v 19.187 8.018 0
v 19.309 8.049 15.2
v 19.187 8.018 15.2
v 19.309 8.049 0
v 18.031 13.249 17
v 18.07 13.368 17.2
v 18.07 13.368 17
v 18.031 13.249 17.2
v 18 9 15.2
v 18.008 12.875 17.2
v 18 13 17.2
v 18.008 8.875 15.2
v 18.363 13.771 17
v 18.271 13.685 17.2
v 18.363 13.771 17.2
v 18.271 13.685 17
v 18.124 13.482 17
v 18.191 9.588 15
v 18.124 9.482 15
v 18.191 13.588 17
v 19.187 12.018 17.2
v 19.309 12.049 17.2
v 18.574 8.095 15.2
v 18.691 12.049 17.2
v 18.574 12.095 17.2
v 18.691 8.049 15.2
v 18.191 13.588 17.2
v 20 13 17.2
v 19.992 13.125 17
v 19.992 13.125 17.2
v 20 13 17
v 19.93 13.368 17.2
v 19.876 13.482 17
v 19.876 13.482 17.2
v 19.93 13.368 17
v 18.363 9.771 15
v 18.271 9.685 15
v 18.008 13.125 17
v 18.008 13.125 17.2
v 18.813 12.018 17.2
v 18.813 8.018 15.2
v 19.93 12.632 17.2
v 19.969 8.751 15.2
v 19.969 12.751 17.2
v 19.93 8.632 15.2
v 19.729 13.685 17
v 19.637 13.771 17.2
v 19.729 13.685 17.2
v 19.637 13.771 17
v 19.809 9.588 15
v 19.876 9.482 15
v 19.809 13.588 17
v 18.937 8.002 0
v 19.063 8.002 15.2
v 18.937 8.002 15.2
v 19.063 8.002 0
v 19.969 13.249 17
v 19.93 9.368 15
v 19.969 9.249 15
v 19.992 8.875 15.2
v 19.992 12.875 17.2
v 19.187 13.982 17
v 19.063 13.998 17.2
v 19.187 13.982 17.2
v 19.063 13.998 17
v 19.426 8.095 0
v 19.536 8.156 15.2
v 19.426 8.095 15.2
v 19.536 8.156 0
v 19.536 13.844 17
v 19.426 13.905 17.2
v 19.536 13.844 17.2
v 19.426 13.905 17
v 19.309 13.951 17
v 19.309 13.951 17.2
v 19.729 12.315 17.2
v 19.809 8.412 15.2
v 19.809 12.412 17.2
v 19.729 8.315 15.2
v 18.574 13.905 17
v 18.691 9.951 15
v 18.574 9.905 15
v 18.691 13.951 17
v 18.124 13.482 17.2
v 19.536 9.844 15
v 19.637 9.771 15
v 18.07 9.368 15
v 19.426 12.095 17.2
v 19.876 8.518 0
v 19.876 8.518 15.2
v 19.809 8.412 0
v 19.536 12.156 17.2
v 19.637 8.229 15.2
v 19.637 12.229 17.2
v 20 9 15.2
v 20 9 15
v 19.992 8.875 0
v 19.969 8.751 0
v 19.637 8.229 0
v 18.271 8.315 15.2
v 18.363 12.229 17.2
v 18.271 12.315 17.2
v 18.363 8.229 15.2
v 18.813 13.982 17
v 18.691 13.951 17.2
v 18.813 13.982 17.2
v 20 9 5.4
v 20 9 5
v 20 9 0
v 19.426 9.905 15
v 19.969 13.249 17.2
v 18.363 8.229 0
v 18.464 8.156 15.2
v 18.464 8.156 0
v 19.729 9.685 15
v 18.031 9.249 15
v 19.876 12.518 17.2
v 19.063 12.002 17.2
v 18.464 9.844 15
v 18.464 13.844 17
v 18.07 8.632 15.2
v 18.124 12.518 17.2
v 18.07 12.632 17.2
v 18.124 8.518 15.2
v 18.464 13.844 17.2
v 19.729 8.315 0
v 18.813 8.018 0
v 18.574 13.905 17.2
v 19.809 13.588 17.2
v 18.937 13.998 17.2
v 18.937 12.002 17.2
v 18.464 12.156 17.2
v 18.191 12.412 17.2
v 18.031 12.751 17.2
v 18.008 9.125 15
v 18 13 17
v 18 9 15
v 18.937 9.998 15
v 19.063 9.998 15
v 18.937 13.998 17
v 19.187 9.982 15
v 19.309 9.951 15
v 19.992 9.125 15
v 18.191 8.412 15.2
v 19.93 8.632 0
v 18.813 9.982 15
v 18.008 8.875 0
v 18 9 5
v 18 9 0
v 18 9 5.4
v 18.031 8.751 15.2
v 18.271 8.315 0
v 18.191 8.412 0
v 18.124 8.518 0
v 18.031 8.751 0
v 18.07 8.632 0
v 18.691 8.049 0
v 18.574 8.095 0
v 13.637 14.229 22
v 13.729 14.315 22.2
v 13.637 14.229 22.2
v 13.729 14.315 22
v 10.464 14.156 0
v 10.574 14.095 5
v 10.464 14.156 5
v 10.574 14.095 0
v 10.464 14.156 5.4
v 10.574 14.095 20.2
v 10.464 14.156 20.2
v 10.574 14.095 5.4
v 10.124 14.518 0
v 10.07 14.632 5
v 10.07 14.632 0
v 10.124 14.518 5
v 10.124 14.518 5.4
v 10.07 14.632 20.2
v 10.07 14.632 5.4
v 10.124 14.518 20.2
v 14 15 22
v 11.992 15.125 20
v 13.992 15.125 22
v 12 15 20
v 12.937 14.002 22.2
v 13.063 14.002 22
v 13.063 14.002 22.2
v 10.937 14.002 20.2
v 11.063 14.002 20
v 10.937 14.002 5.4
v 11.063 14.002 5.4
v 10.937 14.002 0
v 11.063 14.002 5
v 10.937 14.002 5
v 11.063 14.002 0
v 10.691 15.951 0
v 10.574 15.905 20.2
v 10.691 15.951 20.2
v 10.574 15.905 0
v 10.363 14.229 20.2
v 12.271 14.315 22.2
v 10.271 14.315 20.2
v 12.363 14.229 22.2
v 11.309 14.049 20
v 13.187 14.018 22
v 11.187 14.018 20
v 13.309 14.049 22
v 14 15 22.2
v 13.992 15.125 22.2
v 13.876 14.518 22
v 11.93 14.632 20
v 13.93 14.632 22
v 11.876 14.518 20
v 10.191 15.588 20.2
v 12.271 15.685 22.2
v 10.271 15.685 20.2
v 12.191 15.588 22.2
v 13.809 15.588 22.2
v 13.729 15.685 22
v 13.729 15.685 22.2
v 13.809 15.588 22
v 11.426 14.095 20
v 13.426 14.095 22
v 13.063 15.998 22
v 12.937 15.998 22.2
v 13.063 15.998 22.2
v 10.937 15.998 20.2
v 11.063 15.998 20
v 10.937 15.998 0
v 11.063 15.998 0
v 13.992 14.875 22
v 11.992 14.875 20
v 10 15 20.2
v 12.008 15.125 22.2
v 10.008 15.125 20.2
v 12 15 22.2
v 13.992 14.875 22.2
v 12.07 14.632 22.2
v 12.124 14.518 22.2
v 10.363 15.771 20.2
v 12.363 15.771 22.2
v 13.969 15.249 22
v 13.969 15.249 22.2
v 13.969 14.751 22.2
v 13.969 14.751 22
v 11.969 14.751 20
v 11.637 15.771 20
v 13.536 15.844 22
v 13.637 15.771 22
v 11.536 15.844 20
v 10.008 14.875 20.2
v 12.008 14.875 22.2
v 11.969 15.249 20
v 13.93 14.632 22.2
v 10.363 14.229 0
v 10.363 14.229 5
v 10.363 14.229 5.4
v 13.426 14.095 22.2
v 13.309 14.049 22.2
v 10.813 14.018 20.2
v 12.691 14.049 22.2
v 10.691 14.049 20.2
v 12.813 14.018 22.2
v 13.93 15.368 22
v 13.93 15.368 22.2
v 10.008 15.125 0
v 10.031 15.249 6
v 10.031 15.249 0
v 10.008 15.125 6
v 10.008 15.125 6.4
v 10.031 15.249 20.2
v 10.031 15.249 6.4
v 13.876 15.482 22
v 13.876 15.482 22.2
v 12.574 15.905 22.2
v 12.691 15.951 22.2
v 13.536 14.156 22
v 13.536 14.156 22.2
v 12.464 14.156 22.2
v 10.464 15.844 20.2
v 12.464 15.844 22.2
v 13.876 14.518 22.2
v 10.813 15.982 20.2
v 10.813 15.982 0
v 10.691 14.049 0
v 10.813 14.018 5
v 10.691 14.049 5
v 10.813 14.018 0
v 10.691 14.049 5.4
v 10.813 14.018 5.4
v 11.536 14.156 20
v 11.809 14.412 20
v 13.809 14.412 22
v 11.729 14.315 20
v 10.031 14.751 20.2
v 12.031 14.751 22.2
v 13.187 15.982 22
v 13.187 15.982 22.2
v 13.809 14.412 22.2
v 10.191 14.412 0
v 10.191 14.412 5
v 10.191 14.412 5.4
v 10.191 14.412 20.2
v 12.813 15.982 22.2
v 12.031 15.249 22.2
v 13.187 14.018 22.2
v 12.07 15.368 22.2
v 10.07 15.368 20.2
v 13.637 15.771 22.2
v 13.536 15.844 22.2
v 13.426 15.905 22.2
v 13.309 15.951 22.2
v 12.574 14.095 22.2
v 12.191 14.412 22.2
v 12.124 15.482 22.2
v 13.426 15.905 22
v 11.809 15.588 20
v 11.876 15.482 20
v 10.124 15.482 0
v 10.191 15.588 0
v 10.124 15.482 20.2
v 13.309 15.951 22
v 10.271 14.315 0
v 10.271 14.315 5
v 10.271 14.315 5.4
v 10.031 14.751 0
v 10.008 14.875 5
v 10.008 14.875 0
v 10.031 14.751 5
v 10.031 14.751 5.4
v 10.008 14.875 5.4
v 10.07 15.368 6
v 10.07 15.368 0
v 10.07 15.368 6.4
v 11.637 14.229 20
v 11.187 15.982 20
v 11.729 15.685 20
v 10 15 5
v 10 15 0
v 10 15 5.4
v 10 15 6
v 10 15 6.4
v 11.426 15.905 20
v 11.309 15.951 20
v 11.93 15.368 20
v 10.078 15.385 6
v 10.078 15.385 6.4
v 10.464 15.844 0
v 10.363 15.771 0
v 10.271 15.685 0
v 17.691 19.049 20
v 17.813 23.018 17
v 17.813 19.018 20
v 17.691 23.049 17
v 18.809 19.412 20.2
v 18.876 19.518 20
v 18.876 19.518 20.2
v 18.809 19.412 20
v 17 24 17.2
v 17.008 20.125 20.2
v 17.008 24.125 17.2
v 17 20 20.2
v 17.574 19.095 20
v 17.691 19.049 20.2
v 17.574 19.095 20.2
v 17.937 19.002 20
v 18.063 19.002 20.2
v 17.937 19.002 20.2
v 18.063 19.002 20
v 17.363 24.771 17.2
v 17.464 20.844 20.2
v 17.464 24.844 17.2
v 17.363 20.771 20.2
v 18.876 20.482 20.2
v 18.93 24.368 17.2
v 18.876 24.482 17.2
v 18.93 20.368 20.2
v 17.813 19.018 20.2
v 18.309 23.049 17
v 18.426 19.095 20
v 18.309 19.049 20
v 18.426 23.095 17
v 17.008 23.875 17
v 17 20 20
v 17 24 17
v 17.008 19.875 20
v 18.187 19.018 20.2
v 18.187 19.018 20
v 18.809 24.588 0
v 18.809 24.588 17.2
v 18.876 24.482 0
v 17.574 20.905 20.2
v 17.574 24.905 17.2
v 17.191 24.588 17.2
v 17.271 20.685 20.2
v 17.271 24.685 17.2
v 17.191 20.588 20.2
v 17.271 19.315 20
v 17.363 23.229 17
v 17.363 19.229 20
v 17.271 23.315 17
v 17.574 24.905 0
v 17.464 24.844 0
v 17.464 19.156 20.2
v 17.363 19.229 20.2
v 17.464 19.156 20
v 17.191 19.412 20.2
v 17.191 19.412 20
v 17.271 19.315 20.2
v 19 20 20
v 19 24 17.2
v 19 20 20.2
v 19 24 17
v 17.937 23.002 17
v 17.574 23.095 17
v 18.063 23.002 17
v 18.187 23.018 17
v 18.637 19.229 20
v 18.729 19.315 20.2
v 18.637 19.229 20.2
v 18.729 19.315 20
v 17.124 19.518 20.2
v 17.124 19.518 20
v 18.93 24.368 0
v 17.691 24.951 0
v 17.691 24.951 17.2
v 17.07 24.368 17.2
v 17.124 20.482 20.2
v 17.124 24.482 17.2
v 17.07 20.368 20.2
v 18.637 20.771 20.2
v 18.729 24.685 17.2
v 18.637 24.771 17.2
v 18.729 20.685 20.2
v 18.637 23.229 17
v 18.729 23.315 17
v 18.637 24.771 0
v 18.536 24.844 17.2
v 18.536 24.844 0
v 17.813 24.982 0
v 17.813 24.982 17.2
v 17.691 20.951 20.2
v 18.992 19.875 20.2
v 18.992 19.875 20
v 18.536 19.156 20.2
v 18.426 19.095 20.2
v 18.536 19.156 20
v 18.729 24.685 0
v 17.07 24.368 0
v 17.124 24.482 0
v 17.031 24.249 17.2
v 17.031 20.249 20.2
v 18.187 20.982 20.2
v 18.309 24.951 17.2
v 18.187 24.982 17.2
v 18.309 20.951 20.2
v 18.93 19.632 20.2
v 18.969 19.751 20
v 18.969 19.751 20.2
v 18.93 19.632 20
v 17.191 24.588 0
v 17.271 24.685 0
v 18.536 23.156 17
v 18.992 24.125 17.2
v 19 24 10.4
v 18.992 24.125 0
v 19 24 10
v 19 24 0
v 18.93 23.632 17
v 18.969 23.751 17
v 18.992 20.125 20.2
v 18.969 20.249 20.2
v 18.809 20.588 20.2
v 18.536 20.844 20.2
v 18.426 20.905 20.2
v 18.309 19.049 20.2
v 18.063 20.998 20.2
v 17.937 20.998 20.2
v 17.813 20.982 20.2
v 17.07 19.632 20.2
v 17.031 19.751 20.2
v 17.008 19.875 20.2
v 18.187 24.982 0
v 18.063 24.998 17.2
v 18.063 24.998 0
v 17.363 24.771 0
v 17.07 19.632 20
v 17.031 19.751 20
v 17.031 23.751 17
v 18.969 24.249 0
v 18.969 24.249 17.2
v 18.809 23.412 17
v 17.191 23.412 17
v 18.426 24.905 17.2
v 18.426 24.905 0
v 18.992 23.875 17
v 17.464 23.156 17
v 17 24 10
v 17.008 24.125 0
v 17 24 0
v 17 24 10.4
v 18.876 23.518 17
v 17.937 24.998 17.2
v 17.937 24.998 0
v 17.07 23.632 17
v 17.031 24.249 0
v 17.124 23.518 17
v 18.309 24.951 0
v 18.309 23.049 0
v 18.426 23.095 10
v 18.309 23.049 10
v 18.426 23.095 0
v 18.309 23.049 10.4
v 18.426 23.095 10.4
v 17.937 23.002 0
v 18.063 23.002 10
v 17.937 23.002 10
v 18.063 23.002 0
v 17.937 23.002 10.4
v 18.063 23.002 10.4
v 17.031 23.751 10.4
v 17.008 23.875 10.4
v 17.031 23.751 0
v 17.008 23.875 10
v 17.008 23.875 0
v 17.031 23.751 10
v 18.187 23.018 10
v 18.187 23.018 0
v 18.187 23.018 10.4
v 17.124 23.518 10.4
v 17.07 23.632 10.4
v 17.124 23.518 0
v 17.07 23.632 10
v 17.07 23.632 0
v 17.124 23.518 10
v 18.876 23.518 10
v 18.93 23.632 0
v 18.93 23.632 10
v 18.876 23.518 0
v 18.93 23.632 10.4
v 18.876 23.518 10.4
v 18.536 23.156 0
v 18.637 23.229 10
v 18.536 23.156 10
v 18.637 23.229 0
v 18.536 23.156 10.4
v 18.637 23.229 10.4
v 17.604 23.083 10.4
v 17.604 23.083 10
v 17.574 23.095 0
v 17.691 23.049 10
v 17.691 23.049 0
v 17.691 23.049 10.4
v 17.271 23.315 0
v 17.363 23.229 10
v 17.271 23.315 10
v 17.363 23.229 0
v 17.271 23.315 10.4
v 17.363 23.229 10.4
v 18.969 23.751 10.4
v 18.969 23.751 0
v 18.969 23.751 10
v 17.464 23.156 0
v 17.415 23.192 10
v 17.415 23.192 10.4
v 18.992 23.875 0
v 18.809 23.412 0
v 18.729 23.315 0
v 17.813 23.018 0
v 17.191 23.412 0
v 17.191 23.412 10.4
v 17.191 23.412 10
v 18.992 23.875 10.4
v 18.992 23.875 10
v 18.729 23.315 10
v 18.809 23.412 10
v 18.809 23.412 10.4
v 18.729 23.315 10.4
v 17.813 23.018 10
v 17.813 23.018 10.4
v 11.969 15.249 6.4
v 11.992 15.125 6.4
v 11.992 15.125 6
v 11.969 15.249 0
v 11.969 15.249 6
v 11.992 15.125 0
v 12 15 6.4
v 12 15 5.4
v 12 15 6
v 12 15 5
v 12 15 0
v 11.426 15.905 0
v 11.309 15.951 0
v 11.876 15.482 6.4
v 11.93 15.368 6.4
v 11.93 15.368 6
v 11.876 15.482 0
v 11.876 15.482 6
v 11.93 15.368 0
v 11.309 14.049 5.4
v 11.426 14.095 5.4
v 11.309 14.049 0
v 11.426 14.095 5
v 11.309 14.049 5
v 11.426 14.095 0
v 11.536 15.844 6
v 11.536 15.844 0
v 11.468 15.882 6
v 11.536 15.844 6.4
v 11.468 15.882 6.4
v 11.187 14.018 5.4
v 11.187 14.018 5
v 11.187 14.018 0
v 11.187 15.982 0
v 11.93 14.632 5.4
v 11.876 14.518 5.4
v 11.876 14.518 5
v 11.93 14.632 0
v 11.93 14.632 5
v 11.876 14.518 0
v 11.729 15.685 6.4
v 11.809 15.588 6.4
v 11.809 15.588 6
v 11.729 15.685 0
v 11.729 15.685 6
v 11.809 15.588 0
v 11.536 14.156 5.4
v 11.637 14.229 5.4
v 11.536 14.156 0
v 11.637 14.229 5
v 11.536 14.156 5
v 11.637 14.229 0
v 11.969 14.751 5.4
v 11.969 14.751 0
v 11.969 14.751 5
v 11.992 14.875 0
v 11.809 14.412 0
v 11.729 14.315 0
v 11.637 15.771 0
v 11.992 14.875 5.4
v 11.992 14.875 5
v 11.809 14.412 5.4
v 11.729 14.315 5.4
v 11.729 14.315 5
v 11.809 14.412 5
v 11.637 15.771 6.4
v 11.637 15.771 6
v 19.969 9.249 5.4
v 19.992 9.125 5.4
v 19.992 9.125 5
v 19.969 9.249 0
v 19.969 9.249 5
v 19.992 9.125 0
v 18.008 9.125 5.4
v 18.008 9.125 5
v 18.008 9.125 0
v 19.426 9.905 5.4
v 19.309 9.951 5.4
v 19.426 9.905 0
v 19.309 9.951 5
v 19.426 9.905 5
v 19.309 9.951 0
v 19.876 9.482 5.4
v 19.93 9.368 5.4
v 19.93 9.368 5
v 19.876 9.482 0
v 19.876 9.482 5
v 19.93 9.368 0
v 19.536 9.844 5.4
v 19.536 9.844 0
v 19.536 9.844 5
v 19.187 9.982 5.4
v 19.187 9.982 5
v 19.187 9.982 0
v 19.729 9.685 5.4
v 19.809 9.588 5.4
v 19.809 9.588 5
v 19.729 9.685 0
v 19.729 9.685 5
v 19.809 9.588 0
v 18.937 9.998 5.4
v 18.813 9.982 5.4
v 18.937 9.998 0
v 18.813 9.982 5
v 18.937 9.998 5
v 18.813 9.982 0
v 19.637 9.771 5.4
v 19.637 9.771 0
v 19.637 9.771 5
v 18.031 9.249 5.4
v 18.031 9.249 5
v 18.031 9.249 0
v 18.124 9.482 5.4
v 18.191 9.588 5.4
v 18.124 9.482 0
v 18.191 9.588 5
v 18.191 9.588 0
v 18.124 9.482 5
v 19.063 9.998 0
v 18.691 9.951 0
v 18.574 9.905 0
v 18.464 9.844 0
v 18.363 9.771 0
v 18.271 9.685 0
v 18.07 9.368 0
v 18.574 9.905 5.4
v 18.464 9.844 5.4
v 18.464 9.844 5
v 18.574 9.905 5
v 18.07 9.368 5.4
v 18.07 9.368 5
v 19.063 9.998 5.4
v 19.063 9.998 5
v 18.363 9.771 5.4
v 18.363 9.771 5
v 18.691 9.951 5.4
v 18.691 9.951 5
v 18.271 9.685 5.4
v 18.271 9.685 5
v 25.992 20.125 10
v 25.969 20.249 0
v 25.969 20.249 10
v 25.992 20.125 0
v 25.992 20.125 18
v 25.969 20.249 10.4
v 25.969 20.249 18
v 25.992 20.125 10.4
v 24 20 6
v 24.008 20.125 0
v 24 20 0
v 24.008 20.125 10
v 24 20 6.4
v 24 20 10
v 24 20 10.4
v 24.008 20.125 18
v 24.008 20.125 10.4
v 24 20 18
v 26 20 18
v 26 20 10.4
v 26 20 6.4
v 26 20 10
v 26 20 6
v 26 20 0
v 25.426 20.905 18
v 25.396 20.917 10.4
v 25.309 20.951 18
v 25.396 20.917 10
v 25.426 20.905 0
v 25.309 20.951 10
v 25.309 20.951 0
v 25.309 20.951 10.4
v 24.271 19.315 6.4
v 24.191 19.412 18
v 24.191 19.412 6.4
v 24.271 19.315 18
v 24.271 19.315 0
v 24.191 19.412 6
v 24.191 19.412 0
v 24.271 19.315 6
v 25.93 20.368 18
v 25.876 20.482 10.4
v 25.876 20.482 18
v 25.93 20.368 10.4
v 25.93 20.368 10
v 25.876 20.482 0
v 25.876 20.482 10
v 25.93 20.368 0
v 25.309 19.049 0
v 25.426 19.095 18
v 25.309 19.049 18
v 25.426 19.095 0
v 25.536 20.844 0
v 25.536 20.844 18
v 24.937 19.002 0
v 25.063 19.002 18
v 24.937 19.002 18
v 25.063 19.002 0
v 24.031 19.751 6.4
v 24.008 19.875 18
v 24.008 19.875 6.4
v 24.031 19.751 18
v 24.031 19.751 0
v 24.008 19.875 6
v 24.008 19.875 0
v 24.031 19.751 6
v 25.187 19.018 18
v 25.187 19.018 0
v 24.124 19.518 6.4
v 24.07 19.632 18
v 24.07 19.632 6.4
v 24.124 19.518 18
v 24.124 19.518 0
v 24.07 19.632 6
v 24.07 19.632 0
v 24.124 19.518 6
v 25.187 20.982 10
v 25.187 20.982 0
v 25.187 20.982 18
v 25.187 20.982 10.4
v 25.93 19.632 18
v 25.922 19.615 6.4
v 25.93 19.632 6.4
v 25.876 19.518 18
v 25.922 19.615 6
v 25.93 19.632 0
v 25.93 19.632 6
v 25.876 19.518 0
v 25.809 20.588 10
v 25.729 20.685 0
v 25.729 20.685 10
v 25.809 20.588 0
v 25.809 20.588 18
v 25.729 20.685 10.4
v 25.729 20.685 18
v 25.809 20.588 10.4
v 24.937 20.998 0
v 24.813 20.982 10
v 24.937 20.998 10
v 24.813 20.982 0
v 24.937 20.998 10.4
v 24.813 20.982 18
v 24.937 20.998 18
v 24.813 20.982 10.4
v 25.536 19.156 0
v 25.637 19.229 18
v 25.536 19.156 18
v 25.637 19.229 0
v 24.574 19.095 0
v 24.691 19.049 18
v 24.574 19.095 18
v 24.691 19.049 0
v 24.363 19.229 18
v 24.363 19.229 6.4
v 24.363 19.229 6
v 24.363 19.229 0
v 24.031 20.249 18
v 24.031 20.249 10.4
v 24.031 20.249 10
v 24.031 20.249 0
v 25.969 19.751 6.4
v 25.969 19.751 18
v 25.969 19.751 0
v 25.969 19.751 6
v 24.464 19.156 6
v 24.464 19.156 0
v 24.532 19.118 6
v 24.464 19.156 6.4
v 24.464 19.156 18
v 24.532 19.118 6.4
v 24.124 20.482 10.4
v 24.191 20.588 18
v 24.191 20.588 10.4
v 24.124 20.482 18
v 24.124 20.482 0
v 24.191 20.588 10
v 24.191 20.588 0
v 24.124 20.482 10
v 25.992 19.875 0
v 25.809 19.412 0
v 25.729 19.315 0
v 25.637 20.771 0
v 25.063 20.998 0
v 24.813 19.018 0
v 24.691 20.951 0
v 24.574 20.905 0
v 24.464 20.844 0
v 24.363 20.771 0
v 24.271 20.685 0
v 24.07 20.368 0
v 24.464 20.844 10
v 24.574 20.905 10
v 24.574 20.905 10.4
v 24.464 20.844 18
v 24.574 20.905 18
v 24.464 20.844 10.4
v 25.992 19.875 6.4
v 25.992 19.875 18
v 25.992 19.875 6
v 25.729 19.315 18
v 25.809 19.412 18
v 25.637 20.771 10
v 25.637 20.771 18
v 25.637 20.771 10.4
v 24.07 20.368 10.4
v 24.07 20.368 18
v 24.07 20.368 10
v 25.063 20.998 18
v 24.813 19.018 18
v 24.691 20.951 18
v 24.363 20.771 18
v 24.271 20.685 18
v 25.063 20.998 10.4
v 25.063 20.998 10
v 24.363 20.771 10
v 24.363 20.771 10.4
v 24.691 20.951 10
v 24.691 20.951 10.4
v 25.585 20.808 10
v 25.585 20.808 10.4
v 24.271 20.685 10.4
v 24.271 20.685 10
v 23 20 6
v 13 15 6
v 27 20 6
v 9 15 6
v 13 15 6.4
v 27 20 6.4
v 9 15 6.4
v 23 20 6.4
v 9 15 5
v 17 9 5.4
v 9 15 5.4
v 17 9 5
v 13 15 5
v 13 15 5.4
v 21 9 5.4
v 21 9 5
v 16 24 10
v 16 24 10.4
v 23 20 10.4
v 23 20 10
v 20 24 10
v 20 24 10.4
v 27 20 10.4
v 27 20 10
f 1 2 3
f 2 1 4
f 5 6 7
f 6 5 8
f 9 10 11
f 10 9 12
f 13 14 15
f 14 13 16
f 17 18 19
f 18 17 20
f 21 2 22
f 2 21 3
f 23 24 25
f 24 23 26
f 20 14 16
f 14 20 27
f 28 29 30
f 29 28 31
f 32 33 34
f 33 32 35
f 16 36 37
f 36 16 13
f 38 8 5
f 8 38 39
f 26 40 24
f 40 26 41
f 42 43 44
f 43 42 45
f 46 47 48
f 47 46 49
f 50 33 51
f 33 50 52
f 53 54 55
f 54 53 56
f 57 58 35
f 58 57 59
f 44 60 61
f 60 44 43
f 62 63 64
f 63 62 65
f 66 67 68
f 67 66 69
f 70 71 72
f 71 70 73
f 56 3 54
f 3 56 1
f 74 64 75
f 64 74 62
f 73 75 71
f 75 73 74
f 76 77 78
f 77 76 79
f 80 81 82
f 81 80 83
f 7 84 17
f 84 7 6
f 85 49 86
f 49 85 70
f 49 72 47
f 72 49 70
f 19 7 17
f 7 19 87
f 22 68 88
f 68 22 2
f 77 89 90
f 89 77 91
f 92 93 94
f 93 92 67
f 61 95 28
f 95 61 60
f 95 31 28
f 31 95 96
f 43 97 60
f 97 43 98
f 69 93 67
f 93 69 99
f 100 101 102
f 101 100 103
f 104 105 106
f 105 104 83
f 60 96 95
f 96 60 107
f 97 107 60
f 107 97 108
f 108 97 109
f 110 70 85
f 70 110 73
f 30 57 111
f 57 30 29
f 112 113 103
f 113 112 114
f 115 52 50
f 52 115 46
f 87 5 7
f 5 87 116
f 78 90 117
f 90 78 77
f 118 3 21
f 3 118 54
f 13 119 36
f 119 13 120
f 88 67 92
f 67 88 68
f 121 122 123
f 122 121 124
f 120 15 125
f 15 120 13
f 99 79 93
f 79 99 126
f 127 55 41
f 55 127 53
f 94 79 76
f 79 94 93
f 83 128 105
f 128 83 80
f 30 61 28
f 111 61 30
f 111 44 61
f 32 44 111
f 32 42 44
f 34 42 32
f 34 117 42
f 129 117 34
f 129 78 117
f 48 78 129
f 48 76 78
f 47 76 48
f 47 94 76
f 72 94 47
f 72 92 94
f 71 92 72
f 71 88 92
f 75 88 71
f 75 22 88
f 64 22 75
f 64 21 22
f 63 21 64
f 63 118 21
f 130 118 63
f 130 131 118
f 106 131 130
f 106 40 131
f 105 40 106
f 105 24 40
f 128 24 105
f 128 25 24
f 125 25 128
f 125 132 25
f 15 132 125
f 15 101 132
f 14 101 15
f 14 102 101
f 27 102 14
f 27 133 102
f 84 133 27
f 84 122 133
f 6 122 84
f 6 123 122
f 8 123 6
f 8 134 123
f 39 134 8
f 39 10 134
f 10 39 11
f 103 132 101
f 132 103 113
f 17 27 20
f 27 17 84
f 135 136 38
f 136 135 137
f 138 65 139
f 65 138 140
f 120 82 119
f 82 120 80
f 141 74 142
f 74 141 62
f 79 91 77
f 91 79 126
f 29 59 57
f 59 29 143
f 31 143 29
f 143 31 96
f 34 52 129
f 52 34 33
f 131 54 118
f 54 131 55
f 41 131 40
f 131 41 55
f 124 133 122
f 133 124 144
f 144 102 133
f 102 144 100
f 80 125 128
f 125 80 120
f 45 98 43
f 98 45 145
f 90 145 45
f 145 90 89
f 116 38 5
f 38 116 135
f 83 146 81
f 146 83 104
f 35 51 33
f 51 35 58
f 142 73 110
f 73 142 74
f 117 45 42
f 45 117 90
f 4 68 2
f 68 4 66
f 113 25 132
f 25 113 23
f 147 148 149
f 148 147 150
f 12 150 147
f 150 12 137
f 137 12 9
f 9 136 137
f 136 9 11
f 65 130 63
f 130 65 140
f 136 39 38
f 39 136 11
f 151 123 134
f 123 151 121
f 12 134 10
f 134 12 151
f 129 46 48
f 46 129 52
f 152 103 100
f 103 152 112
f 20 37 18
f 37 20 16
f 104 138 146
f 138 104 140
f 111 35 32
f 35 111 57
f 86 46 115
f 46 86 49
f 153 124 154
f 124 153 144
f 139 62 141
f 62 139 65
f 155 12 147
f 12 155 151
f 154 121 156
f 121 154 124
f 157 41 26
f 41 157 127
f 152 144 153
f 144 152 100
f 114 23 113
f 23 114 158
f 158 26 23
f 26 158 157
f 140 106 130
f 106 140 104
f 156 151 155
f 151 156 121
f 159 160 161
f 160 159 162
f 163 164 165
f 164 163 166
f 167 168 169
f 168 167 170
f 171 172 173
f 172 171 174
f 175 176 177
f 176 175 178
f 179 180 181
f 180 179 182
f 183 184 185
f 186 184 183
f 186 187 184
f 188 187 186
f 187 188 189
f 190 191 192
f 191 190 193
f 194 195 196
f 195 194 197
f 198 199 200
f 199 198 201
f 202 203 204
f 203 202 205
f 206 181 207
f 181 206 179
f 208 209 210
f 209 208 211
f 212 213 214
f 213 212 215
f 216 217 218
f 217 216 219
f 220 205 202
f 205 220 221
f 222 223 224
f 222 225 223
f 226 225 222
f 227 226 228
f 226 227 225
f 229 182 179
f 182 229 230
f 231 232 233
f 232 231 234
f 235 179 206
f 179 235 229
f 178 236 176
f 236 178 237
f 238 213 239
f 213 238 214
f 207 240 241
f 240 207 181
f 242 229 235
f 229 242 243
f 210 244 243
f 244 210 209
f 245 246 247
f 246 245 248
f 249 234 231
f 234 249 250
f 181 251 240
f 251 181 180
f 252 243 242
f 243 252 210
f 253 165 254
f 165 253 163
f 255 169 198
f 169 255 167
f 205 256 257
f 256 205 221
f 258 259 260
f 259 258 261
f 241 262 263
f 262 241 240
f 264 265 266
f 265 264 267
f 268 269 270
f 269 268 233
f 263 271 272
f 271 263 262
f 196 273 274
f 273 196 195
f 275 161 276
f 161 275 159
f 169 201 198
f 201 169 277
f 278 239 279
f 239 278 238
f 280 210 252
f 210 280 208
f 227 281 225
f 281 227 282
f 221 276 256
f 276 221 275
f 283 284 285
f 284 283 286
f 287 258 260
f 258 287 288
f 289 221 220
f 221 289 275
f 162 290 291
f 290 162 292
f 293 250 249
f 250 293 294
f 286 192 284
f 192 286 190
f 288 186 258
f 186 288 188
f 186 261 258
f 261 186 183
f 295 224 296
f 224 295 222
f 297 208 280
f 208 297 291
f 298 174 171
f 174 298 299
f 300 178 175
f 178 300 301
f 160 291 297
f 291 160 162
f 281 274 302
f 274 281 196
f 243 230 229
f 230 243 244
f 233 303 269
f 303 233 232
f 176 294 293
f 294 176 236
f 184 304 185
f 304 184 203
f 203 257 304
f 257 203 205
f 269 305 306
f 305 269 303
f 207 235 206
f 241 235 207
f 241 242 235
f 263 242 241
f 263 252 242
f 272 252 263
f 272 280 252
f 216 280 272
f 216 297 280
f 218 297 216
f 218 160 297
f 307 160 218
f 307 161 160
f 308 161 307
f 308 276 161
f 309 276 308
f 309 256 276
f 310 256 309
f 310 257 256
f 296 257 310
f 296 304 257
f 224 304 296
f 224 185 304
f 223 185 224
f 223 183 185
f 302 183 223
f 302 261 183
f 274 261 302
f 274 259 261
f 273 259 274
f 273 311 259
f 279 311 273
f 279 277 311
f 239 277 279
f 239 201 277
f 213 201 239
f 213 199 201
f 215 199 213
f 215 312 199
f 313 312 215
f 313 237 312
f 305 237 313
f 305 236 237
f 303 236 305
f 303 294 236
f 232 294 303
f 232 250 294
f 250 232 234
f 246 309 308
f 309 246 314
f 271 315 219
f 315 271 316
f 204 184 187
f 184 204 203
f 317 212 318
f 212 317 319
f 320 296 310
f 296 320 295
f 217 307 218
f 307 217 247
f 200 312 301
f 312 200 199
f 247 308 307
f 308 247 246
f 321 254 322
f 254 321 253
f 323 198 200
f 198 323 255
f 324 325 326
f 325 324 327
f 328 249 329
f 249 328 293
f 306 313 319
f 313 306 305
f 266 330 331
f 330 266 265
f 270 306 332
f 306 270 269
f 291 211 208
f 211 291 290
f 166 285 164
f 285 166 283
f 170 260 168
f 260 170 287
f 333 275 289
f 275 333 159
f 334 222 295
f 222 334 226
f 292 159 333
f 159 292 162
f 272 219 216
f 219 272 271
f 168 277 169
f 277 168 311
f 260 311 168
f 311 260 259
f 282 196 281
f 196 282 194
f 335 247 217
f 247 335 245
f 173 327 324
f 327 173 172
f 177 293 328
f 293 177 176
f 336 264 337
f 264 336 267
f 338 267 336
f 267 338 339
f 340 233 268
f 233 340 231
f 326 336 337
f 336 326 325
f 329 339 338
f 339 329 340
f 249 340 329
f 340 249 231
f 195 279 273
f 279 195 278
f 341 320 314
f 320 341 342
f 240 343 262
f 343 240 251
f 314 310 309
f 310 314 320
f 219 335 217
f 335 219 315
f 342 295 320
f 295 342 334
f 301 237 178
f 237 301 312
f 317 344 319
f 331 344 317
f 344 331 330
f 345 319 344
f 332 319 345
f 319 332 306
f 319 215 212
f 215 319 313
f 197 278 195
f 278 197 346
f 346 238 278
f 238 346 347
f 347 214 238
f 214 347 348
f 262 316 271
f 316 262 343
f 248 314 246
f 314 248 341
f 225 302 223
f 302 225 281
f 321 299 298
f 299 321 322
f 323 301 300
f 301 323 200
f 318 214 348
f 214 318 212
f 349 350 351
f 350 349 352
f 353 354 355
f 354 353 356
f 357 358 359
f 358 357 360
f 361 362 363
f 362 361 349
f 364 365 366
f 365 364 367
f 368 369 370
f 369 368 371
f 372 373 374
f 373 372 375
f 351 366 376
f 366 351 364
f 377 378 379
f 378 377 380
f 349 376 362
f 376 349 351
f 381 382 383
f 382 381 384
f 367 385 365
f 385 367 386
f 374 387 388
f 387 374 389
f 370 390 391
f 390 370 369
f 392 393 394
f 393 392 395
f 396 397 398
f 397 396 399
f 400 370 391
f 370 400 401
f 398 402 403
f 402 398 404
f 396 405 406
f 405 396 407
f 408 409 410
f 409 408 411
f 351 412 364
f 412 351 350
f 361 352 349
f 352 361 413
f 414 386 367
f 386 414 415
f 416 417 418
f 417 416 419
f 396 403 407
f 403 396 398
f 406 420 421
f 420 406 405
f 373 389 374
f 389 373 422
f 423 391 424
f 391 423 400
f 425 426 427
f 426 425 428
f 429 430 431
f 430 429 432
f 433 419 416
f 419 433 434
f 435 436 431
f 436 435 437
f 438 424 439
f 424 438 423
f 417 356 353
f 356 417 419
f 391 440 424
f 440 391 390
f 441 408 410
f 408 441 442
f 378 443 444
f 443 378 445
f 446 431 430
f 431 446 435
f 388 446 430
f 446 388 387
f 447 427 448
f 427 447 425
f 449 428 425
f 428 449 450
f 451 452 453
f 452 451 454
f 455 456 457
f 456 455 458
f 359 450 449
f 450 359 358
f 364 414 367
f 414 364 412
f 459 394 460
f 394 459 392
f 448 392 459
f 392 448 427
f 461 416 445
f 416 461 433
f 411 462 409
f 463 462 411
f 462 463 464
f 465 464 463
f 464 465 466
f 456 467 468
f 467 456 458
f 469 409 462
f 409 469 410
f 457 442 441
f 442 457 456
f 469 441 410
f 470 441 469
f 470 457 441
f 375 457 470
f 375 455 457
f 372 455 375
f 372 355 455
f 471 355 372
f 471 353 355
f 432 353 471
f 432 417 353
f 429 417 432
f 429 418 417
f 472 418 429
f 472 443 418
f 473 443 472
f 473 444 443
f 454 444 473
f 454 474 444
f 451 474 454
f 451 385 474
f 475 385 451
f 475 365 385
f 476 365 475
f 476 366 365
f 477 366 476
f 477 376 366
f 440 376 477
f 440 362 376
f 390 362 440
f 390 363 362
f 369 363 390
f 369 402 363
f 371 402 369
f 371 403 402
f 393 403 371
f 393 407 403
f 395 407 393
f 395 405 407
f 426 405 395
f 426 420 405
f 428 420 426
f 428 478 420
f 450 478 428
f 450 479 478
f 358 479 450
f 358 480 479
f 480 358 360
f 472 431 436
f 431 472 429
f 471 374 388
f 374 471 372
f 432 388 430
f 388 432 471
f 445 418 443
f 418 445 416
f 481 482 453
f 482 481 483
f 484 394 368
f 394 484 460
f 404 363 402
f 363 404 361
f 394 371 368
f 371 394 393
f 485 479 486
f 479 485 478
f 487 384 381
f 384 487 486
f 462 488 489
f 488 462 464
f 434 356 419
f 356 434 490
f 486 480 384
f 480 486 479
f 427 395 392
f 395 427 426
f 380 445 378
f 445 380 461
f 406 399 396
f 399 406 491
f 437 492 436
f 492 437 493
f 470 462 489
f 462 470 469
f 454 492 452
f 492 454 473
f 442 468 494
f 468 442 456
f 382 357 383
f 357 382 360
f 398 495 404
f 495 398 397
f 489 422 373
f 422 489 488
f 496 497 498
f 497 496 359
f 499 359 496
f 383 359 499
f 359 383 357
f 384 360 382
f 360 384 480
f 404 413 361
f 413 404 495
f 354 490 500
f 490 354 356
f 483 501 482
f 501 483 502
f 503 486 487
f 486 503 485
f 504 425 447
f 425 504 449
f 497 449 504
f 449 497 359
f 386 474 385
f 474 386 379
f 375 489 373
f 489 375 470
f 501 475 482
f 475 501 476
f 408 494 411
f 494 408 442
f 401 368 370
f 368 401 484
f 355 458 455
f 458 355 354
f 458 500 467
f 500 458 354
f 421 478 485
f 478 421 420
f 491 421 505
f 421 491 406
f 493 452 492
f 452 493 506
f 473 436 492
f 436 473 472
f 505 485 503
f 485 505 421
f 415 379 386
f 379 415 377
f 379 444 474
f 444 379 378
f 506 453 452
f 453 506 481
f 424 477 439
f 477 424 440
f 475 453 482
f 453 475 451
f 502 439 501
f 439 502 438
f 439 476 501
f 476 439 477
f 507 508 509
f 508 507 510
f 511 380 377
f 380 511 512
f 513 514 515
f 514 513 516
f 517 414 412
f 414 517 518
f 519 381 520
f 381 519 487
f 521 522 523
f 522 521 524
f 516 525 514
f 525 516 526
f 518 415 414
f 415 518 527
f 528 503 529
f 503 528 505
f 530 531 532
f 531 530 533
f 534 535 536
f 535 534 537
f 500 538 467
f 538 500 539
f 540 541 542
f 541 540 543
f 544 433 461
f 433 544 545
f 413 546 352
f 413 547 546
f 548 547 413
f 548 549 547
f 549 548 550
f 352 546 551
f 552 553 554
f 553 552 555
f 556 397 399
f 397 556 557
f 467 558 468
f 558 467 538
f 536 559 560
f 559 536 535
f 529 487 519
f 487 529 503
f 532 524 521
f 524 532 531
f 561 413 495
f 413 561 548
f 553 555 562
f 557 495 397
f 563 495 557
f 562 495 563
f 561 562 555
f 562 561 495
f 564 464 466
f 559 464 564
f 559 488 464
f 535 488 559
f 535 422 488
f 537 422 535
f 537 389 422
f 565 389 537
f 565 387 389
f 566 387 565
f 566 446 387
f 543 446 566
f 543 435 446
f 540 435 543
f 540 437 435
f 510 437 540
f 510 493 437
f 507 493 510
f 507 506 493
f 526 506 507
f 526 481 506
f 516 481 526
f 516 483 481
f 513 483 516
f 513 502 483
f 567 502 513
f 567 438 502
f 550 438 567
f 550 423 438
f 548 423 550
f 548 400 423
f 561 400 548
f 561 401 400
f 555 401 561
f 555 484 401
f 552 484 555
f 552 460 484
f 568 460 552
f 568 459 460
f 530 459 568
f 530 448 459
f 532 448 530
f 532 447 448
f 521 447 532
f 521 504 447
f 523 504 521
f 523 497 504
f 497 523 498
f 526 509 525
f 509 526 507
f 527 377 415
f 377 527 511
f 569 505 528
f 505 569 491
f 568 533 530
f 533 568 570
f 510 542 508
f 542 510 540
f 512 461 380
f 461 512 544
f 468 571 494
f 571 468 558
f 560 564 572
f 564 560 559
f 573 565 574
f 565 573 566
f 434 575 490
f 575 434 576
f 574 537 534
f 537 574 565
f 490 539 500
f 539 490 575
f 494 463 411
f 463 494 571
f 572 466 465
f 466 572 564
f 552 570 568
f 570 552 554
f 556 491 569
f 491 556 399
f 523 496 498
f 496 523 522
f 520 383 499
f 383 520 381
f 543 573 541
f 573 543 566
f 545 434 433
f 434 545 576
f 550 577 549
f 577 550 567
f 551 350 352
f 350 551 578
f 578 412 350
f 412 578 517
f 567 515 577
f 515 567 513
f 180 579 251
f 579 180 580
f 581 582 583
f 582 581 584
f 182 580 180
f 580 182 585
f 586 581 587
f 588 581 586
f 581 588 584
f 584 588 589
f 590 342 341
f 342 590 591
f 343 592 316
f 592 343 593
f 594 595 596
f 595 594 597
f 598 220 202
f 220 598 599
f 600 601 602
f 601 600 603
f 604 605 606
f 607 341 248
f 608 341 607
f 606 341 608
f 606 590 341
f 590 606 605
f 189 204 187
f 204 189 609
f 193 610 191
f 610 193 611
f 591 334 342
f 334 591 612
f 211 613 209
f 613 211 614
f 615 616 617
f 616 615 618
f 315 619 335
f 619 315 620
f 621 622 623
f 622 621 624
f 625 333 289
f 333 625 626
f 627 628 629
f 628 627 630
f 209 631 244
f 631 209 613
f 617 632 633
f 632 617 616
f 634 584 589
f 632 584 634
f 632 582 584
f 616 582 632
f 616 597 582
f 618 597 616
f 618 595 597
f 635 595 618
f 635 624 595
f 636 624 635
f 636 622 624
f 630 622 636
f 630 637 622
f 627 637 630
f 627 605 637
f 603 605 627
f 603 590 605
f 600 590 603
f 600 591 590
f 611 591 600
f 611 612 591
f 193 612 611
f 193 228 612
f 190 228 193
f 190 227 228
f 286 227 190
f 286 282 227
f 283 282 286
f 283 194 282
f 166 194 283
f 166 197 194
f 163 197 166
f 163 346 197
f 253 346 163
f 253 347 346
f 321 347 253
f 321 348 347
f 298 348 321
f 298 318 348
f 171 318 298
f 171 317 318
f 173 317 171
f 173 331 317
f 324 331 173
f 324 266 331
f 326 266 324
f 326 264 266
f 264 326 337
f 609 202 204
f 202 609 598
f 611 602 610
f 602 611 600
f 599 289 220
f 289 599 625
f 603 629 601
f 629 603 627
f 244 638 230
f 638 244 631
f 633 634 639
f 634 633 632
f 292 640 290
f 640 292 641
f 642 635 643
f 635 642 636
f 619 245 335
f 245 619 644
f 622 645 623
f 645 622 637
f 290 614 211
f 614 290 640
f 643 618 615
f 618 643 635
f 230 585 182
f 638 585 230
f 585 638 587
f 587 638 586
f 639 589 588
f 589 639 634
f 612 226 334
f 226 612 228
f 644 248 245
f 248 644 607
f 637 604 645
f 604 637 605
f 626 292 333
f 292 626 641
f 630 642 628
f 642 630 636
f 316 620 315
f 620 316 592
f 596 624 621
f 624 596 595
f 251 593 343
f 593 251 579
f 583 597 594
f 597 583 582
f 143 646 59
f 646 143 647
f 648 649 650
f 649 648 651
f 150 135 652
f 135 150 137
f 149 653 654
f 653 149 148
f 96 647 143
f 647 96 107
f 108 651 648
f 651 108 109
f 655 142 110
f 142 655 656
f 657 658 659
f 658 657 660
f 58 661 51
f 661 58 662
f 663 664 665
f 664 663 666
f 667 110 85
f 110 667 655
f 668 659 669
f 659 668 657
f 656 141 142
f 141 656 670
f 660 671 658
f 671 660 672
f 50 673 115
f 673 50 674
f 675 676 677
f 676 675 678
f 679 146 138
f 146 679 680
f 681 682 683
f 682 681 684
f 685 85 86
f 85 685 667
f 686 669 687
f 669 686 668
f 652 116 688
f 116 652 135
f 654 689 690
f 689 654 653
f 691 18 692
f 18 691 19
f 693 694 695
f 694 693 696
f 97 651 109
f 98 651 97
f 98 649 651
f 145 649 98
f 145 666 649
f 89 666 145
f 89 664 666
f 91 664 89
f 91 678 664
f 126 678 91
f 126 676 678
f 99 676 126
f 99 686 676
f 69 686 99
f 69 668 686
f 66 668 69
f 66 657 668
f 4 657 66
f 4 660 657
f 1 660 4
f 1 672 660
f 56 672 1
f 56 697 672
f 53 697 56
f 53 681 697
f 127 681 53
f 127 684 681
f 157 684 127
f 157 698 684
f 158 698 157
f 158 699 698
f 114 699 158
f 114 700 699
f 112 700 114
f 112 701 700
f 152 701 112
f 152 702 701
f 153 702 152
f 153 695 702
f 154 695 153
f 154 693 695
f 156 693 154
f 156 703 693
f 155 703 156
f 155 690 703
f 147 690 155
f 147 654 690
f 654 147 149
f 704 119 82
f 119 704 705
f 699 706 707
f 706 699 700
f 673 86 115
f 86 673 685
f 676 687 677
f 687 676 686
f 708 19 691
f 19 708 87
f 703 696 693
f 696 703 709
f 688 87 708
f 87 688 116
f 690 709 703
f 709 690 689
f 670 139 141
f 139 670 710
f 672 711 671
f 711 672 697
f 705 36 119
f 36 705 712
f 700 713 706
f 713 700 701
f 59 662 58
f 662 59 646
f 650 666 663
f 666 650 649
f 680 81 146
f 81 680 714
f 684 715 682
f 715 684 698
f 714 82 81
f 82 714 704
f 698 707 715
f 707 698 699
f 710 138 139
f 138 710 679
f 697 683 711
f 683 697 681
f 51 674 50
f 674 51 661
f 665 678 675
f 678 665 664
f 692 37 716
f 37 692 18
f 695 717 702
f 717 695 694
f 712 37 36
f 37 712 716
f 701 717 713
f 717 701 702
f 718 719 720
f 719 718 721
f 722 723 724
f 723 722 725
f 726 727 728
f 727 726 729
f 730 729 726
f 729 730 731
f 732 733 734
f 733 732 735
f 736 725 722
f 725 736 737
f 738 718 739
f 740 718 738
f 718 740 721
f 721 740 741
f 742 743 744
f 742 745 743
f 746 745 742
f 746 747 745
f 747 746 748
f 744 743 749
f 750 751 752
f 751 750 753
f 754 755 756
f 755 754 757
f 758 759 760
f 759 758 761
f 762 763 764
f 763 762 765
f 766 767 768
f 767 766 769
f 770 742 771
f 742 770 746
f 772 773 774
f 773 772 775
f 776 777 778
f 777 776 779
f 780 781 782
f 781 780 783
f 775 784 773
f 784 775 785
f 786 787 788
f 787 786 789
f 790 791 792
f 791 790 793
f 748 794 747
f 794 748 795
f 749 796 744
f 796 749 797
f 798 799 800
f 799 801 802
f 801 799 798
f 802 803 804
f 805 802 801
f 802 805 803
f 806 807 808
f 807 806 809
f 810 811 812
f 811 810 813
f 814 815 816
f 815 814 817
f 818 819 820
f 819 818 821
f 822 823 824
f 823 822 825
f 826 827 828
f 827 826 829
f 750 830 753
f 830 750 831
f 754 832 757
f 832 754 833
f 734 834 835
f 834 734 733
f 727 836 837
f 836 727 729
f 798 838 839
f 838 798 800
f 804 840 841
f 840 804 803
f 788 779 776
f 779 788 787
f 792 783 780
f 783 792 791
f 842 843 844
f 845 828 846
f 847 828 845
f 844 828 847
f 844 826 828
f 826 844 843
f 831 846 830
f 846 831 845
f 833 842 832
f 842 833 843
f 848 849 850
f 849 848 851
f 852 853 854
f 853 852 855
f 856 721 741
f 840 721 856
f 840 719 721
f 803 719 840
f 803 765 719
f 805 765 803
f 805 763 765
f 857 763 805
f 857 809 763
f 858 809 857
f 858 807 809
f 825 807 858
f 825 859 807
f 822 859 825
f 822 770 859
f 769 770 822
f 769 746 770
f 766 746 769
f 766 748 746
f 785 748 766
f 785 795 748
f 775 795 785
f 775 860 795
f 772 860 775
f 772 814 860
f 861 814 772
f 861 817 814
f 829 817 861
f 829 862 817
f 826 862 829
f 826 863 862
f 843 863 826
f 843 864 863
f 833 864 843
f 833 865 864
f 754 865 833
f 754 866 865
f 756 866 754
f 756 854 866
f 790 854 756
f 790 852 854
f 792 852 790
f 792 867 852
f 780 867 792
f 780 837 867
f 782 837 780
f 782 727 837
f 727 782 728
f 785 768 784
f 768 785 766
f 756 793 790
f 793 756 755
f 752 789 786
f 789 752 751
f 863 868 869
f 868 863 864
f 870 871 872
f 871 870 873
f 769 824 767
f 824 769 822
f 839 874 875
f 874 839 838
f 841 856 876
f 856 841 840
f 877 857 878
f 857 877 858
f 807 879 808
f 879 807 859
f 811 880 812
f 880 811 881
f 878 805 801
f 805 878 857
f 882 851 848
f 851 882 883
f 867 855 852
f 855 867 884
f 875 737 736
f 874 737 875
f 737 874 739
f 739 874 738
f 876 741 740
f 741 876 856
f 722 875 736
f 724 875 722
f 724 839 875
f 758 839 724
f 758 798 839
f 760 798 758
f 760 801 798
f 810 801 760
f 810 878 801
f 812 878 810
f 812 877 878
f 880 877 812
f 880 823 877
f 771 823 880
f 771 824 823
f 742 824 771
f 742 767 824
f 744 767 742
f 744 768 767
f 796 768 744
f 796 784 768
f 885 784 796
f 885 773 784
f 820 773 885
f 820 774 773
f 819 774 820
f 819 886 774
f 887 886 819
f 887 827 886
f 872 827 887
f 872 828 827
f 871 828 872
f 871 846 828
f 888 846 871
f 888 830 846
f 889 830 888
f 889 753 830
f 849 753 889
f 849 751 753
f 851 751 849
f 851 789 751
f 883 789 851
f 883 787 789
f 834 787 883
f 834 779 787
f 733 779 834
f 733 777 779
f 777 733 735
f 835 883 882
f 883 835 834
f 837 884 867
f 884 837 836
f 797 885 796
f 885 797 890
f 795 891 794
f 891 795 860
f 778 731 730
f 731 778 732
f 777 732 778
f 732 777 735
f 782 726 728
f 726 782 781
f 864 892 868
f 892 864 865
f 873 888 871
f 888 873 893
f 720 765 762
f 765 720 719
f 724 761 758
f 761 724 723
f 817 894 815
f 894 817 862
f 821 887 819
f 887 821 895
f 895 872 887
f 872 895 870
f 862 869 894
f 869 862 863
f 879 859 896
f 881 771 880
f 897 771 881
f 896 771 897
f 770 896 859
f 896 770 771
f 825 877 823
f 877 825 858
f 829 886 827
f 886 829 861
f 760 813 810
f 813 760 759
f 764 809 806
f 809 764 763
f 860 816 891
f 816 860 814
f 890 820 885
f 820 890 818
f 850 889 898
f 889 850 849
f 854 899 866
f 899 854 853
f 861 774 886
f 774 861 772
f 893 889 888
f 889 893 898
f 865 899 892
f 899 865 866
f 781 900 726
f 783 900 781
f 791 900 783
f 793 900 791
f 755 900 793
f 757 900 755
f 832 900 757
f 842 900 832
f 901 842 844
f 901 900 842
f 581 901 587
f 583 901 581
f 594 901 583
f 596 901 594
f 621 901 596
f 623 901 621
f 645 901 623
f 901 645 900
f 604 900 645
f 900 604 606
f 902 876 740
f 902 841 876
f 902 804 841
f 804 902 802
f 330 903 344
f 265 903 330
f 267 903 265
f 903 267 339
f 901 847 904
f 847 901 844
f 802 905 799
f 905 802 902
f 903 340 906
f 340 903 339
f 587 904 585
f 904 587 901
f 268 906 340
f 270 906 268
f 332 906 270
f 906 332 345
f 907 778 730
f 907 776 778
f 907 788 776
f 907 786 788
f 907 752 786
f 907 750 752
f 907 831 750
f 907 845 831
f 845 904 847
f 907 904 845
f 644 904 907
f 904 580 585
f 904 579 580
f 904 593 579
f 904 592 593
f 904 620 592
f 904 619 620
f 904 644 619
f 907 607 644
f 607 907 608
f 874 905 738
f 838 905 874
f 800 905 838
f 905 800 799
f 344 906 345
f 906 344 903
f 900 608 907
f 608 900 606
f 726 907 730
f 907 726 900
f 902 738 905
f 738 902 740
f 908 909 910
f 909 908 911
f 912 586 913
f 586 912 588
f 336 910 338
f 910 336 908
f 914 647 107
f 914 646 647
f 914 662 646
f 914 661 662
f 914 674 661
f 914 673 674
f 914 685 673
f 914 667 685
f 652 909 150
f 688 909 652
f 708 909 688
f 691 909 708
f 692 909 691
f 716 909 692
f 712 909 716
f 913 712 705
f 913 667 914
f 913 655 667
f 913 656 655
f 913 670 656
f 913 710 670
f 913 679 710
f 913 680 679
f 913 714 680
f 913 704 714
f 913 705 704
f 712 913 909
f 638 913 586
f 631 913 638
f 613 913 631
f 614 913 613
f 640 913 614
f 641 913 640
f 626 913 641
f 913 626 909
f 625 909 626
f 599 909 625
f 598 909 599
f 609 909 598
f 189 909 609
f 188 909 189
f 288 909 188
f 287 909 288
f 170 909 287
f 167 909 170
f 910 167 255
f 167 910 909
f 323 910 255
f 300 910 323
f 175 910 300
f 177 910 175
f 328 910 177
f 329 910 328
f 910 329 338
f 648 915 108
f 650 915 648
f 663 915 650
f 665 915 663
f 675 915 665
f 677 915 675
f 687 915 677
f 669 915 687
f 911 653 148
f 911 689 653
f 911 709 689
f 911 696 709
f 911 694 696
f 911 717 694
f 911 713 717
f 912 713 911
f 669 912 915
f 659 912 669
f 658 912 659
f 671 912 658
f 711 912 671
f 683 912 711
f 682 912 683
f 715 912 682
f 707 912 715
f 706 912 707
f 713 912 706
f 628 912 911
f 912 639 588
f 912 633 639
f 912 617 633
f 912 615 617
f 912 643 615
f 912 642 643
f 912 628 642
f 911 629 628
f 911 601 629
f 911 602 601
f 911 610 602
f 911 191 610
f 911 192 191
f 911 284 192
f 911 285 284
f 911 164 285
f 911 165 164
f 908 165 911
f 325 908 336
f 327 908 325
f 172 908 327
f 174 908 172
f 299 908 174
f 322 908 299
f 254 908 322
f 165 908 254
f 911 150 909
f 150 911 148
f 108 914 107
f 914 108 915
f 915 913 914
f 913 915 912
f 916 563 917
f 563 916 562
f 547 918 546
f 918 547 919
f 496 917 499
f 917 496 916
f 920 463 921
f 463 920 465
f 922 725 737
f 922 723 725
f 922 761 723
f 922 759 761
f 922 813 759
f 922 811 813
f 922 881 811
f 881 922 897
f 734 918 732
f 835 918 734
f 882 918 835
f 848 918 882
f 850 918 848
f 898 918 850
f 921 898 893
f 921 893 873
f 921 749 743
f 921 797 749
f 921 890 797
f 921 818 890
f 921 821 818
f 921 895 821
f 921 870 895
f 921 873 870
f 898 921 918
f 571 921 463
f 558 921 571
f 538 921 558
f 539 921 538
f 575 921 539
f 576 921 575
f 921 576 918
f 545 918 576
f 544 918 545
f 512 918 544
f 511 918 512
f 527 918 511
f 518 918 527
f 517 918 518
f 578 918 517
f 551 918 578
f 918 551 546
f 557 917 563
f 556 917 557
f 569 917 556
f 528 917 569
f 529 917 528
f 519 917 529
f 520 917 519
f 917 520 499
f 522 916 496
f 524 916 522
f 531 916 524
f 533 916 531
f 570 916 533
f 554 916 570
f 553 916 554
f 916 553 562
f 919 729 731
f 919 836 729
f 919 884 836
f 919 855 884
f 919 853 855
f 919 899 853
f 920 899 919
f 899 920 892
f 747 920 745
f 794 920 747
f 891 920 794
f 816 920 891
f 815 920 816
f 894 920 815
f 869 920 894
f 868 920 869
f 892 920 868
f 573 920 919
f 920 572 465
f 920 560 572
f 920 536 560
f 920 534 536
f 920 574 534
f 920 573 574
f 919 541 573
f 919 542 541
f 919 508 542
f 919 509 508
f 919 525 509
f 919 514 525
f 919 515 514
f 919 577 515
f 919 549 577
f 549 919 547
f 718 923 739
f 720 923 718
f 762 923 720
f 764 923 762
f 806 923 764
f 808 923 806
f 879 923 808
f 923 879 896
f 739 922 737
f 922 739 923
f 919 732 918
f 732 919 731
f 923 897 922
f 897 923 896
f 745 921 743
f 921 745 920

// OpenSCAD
//scad pillars and bars generated by code

$fa = 50;
$fn = 50;
radius = 1;
delta = 2;
height = 0.4;

module circle1(x_coord, y_coord, z_coord)
{
	translate([x_coord, y_coord, z_coord])
	cylinder(.2, radius, radius);
}
module circle2(x_coord, y_coord, z_coord)
{
	translate([x_coord, y_coord, z_coord])
	cylinder(.2, radius, radius);
}
module slanted_pillar(x_coord1, y_coord1, z_coord1, x_coord2, y_coord2, z_coord2)
{
	hull()
	{
		circle1(x_coord1, y_coord1, z_coord1);
		circle2(x_coord2, y_coord2, z_coord2);
	}
}
module pillar(x_coord, y_coord, z_coord, z_height)
{
	translate([x_coord, y_coord, z_coord])
	linear_extrude(z_height)
	circle(radius);
}

//does not work for horizontal bridges, use bridge1
module bridge(x0, y0, x1, y1, z_height)
{
translate([0, 0, z_height])
linear_extrude(height)
polygon(points = [[x0+delta, y0], [x0-delta, y0], [x1-delta, y1], [x1+delta, y1]]);
}

//does not work for vertical bridges, use bridge
module bridge1(x0, y0, x1, y1, z_height)
{
translate([0, 0, z_height])
linear_extrude(height)
polygon(points = [[x0, y0+delta], [x0, y0-delta], [x1, y1-delta], [x1, y1+delta]]);
}

union()
{
//adding slanted pillar
	slanted_pillar(19, 13, 17, 19, 9, 15);
//adding slanted pillar
	slanted_pillar(13, 15, 22, 11, 15, 20);
//adding slanted pillar
	slanted_pillar(18, 20, 20, 18, 24, 17);
//adding point
	pillar(18, 24, 0, 17);
//adding point
	pillar(11, 15, 0, 20);
//adding point
	pillar(19, 9, 0, 15);
//adding point
	pillar(25, 20, 0, 18);
//adding bridge
	bridge(11, 15, 25, 20, 6);
	pillar(11, 15, 6, 14);
	pillar(25, 20, 6, 12);
//adding bridge
	bridge(19, 9, 11, 15, 5);
	pillar(19, 9, 5, 10);
	pillar(11, 15, 5, 15);
//adding bridge
	bridge(25, 20, 18, 24, 10);
	pillar(25, 20, 10, 8);
	pillar(18, 24, 10, 7);
}
